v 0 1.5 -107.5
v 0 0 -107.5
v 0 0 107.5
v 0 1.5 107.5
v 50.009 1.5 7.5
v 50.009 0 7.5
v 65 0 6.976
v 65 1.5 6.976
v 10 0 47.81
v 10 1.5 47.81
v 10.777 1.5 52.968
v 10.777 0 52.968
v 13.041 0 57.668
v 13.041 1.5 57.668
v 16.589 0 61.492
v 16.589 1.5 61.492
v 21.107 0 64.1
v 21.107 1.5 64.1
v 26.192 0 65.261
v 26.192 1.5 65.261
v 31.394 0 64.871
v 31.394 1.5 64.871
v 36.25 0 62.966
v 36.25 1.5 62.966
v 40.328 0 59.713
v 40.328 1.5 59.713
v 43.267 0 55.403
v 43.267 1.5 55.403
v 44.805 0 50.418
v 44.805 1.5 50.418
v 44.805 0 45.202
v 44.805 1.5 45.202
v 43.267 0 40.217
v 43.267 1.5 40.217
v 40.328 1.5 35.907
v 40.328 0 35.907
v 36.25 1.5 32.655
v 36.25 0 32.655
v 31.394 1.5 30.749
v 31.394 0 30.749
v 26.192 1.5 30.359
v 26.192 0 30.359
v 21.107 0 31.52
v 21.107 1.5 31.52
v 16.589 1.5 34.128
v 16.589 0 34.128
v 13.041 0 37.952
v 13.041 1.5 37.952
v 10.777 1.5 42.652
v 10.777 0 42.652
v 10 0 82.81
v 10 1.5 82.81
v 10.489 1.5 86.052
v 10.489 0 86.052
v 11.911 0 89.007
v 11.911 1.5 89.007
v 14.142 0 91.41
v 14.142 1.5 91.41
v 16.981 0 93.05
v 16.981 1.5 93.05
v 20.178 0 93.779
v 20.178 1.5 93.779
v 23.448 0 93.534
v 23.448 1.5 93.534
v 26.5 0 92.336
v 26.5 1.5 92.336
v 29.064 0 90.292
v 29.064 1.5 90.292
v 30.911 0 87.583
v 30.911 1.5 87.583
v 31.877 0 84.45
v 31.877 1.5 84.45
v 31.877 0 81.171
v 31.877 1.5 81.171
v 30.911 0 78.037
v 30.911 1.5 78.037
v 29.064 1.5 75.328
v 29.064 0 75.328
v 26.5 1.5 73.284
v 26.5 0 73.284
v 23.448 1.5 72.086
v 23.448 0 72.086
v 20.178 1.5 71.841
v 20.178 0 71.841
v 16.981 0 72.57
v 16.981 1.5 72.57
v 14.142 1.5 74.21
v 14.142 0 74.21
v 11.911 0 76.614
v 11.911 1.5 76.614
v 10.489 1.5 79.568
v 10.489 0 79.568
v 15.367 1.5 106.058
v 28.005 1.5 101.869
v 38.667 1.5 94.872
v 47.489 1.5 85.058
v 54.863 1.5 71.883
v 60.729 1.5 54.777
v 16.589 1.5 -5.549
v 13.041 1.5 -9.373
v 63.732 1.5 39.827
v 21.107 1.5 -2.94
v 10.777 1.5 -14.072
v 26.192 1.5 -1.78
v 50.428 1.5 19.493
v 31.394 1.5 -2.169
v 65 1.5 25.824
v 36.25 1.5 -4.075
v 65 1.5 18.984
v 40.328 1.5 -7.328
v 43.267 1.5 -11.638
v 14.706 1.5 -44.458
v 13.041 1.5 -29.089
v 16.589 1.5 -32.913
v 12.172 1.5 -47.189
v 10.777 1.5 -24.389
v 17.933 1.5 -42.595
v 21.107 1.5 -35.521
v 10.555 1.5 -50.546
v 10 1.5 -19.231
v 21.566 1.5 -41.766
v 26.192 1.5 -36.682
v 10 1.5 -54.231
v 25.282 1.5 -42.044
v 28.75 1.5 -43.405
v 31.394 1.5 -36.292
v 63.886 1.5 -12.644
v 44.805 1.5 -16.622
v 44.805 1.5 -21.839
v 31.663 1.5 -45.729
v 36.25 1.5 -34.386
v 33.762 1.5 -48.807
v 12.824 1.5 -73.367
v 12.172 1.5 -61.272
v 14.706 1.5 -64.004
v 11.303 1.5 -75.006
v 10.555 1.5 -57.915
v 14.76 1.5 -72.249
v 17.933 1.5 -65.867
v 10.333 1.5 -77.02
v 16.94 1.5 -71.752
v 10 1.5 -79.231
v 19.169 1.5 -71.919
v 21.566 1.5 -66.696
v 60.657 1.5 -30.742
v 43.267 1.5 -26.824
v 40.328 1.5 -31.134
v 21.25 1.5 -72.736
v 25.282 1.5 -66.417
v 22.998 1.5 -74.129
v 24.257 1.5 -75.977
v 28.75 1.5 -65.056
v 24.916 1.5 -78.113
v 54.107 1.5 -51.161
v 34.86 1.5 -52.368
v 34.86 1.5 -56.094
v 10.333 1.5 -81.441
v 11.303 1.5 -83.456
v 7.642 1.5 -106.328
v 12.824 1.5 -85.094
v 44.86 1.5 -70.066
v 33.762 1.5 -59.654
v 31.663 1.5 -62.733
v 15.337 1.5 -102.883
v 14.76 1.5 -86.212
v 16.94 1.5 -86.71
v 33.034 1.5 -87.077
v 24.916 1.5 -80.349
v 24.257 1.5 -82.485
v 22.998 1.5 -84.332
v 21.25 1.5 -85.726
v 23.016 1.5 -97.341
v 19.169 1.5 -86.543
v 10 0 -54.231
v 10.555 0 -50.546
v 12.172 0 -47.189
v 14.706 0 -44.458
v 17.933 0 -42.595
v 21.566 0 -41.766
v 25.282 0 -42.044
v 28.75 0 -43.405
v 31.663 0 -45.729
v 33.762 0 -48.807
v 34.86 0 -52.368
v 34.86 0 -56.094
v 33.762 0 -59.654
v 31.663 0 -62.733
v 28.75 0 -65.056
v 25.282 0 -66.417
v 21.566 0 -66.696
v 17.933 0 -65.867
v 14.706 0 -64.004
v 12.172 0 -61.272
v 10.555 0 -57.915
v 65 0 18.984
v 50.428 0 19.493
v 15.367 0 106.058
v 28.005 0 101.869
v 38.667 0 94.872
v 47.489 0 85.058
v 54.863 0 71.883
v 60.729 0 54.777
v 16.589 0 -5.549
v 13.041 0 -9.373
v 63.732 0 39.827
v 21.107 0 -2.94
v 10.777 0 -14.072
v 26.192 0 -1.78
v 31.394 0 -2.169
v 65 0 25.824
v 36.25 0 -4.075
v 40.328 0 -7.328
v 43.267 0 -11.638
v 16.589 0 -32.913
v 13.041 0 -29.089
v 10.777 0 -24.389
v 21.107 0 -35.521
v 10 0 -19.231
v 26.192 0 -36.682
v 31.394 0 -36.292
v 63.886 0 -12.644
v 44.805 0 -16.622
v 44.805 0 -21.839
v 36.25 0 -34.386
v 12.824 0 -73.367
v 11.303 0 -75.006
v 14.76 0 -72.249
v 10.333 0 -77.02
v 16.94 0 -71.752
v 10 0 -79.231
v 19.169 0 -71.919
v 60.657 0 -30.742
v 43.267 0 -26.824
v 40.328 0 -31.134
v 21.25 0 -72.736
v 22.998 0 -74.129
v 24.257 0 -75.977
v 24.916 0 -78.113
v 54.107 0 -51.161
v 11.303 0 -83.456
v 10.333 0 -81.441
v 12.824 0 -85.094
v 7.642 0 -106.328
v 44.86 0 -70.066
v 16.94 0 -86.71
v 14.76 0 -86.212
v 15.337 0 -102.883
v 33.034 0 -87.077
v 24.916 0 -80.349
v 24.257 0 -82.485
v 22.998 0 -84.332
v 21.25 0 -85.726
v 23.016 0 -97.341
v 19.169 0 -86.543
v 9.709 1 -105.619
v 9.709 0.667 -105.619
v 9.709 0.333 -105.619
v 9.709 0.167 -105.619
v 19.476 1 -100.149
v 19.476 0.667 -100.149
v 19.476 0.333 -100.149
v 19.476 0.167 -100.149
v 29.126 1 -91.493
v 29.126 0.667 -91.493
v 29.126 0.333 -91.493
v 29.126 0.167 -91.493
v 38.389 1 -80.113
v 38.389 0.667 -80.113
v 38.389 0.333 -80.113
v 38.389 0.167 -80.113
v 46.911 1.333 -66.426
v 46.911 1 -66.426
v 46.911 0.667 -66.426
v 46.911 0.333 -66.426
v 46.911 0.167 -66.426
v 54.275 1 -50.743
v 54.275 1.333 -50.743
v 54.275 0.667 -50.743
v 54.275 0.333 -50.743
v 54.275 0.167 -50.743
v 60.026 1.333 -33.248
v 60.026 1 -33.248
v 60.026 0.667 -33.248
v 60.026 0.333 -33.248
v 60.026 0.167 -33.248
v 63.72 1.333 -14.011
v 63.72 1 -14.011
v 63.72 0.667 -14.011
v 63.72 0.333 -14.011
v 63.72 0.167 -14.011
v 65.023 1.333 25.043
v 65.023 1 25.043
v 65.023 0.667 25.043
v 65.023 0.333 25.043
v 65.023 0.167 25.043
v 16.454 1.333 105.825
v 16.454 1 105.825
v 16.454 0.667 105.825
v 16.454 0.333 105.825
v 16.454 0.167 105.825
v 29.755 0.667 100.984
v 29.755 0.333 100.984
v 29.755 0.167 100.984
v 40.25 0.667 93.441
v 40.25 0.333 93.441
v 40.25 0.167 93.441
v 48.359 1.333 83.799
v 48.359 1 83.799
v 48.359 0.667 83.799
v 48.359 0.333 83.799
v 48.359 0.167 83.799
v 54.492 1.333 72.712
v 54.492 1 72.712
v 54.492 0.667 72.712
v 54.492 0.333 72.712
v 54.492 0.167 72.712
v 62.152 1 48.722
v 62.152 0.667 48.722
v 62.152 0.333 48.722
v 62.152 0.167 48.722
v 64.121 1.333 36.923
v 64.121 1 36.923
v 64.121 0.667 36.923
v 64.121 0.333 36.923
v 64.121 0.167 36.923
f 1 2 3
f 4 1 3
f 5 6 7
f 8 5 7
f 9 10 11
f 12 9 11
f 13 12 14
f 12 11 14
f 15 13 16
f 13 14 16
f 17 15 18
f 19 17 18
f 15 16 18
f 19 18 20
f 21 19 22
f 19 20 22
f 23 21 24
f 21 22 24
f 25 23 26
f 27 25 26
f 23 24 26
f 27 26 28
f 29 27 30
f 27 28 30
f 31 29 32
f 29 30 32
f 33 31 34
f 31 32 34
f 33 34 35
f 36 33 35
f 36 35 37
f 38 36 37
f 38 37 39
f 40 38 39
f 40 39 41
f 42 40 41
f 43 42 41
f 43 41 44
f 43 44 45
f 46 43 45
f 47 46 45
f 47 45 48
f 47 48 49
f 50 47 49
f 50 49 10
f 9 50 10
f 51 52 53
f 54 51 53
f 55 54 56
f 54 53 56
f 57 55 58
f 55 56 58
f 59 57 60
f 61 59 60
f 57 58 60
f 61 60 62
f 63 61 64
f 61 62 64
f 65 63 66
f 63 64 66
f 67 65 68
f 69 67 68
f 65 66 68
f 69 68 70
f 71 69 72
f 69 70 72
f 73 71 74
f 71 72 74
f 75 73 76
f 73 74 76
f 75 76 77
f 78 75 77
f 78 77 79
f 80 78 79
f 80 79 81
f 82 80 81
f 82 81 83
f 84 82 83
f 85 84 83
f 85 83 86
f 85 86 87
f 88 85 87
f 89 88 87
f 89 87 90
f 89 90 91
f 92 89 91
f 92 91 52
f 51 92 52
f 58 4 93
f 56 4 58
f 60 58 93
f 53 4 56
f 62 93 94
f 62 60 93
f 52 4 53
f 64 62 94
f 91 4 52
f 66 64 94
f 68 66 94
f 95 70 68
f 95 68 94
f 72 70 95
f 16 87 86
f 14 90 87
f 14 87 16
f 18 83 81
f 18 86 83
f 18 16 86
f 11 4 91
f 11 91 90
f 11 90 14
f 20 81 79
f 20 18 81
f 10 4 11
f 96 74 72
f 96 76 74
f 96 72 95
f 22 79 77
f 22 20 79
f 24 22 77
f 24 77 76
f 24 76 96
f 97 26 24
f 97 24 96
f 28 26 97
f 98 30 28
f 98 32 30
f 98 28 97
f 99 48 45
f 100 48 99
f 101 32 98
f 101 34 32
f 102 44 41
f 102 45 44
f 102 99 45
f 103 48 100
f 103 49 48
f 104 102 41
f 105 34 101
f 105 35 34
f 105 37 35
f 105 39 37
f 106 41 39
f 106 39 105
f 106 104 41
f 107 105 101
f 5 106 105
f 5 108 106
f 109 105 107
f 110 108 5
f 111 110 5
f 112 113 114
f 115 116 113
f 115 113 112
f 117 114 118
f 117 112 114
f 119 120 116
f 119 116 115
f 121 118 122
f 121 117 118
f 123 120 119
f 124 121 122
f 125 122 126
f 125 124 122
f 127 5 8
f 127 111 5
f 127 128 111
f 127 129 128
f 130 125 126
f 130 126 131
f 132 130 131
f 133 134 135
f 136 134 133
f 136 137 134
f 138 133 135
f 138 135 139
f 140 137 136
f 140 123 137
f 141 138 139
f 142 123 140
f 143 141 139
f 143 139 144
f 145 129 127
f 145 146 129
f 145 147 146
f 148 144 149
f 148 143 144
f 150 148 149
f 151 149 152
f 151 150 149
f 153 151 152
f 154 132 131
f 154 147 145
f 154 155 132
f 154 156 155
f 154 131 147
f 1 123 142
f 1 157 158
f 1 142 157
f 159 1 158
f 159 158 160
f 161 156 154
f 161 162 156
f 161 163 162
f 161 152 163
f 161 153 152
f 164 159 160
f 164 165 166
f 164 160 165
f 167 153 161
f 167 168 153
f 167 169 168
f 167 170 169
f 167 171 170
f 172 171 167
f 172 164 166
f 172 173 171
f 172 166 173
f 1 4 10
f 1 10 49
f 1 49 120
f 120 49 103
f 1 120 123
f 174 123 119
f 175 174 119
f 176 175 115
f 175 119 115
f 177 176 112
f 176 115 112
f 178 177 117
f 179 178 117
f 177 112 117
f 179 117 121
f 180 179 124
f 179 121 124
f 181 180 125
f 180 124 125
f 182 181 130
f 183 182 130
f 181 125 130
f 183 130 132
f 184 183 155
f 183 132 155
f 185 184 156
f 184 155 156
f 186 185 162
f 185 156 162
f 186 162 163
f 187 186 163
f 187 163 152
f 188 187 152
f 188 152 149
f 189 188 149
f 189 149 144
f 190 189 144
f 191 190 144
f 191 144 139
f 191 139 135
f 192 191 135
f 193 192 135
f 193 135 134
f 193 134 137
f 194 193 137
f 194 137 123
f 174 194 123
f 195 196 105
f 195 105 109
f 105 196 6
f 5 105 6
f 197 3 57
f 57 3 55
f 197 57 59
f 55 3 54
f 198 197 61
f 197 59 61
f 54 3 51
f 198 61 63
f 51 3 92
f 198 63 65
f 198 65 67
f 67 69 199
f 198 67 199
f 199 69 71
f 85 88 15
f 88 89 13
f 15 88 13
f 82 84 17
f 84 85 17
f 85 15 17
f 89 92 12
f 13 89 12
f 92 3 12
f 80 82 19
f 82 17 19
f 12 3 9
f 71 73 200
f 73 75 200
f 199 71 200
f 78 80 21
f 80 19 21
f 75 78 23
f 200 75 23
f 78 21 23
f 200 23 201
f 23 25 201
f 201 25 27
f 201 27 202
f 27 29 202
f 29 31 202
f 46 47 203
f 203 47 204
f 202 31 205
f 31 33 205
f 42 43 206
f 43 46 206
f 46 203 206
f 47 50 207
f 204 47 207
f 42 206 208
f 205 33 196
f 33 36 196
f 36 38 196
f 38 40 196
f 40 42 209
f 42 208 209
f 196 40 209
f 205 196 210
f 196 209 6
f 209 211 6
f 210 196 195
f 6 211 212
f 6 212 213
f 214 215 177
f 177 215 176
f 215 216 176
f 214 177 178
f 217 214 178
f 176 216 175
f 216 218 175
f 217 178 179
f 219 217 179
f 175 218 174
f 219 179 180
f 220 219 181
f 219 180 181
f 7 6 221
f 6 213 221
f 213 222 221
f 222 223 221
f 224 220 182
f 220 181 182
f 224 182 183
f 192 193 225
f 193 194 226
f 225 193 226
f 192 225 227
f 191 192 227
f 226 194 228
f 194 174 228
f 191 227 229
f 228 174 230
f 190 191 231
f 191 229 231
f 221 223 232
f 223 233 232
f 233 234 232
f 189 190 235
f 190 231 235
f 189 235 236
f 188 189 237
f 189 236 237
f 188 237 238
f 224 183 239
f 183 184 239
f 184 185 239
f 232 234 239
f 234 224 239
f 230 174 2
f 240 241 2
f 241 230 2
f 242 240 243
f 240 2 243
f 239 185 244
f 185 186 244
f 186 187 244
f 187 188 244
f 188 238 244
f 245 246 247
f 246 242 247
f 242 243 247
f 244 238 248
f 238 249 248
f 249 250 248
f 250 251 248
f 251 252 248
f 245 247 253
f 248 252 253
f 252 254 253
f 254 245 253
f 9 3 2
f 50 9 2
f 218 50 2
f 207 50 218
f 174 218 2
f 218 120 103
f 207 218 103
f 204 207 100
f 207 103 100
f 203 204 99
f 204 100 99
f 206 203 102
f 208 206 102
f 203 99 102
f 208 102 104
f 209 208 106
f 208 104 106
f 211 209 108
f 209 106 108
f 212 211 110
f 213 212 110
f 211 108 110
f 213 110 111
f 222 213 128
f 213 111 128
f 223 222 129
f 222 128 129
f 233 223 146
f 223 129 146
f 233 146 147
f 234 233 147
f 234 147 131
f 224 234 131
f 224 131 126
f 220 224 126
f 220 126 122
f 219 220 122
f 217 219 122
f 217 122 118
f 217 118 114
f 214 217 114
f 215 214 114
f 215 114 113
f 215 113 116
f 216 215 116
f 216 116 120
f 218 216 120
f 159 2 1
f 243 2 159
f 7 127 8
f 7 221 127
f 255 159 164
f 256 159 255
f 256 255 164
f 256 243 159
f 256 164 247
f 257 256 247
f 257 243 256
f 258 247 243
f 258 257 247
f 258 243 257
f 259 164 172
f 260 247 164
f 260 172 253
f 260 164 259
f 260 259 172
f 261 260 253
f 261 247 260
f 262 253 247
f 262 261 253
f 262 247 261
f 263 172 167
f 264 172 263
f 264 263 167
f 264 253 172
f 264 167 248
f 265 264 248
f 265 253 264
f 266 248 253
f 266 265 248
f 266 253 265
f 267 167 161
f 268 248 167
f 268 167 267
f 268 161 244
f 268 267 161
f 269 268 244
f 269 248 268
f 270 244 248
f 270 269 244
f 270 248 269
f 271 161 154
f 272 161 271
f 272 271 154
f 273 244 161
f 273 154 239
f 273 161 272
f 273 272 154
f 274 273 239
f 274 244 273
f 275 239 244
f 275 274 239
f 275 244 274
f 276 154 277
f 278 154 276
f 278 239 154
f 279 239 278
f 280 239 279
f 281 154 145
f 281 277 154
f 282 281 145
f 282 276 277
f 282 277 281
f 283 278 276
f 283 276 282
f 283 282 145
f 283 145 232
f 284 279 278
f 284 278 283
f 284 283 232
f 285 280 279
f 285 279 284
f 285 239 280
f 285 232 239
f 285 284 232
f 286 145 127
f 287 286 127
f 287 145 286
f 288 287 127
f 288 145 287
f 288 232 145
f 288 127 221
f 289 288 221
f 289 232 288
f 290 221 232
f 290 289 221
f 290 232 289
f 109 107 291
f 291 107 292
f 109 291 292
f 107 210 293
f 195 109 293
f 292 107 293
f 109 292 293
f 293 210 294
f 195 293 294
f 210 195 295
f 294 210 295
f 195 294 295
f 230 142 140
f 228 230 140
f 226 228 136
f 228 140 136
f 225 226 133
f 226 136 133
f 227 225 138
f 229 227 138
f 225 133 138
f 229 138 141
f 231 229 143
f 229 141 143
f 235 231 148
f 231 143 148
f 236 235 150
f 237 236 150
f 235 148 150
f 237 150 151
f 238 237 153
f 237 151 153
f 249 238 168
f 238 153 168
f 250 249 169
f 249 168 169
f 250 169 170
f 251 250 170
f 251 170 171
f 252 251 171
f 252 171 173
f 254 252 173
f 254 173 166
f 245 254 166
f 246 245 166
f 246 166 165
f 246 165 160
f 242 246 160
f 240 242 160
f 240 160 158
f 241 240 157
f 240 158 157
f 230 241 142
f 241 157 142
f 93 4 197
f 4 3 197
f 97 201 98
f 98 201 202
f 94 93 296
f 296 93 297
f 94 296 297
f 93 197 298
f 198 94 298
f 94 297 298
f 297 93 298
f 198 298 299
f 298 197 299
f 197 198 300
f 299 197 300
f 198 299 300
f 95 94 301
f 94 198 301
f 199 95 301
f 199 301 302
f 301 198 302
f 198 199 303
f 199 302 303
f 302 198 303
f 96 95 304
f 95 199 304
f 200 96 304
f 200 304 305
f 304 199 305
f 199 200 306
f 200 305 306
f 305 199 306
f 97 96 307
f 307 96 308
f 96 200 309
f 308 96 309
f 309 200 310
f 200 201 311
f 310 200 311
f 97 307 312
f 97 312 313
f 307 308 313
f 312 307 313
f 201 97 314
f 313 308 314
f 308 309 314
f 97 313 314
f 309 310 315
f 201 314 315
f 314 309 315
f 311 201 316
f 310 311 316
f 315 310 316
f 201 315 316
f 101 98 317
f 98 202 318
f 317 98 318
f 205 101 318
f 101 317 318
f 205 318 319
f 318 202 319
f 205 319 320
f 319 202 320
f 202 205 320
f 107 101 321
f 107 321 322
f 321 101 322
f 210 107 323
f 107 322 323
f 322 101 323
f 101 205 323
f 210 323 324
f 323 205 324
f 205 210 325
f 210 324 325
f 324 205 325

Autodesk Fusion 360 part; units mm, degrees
sketch "Skizze1" plane through (0, 0, 0) normal (0, 1, 0) x (1, 0, 0)
  line L0 (0, 107.5) -> (0, -107.5)
  line L1 (50.4279, -19.4927) -> (65, -18.9838)
  line L2 (50.4279, -19.4927) -> (50.0091, -7.5)
  line L3 (50.0091, -7.5) -> (65, -6.9765)
  line L4 (0, 0) -> (59.8475, 0) construction
  spline S0 degree 5 poles (0, -107.5) (6.9963, -107.5) (19.7475, -106.2356) (35.1536, -100.5492) (49.2456, -86.624) (59.4624, -63.5268) (63.6472, -44.237) (65.0113, -30.9473) (65.1348, -22.8452) (65, -18.9838) knots 0 0 0 0 0 0 0.2 0.4 0.6 0.8 1 1 1 1 1 1
  line L5 (65.2619, -26.4838) -> (64.7381, -11.4838)
  line L6 (-12.5, -107.5) -> (12.5, -107.5)
  spline S1 degree 5 poles (0, 107.5) (3.4735, 107.5) (10.463, 106.2697) (21.0748, 100.7368) (35.1986, 86.9145) (51.0909, 61.8673) (60.389, 37.1064) (64.1612, 16.0697) (65, 0.897) (65, -6.9765) knots 0 0 0 0 0 0 0.2 0.4 0.6 0.8 1 1 1 1 1 1
  line L7 (-7.5, 107.5) -> (7.5, 107.5)
  line L8 (65, 13.0235) -> (65, -26.9765)
  dimension "d1" = 215
  dimension "d2" = 107.5
  dimension "d4" = 65
  dimension "d5" = 15
  dimension "d7" = 12
  dimension "d8" = 15
  dimension "d9" = 25
  dimension "d10" = 40
  dimension "d11" = 15
  dimension "d12" = 100
  dimension "d13" = 2
extrude "Extrusion1" add sketch "Skizze1" along normal blind 1.5 contours L0 L1 L2 L3 S0 S1 L8 | S0 L8
sketch "Skizze2" plane through (0, 1.5, 0) normal (0, 1, 0) x (-1, 0, 0)
  spline S0 degree 5 poles (0, 107.5) (-6.9963, 107.5) (-19.7475, 106.2356) (-35.1536, 100.5492) (-49.2456, 86.624) (-59.4624, 63.5268) (-63.6472, 44.237) (-65.0113, 30.9473) (-65.1348, 22.8452) (-65, 18.9838) knots 0 0 0 0 0 0 0.2 0.4 0.6 0.8 1 1 1 1 1 1
  line L0 (-65, 18.9838) -> (-50.4279, 19.4927)
  line L1 (-50.4279, 19.4927) -> (-50.0091, 7.5)
  line L2 (-50.0091, 7.5) -> (-65, 6.9765)
  spline S1 degree 5 poles (-65, 6.9765) (-65, -0.897) (-64.1612, -16.0697) (-60.389, -37.1064) (-51.0909, -61.8673) (-35.1986, -86.9145) (-21.0748, -100.7368) (-10.463, -106.2697) (-3.4735, -107.5) (0, -107.5) knots -1 -1 -1 -1 -1 -1 -0.8 -0.6 -0.4 -0.2 0 0 0 0 0 0
  line L3 (0, -107.5) -> (0, 107.5)
  line L4 (-10, -105.5059) -> (-10, 106.9256) construction
  line L5 (-64.7198, -3.0198) -> (0, -0.7597) construction
  line L6 (-64.8519, 28.9951) -> (0, 31.2598) construction
  circle A0 centre (-27.5, -19.2307) radius 17.5
  circle A1 centre (-22.5, -54.2307) radius 12.5
  circle A2 centre (-17.5, -79.2307) radius 7.5
  circle A3 centre (-27.5, 47.8101) radius 17.5
  circle A4 centre (-21, 82.8101) radius 11
  dimension "d16" = 10
  dimension "d17" = 10
  dimension "d18" = 10
  dimension "d19" = 35
  dimension "d20" = 25
  dimension "d21" = 35
  dimension "d22" = 15
  dimension "d23" = 25
  dimension "d24" = 35
  dimension "d25" = 35
  dimension "d28" = 22
extrude "Extrusion2" cut sketch "Skizze2" against normal blind 5 contours A0 | A1 | A2 | A3 | A4
equation "d2 = d1 / 2"
equation "d18 = d17"
